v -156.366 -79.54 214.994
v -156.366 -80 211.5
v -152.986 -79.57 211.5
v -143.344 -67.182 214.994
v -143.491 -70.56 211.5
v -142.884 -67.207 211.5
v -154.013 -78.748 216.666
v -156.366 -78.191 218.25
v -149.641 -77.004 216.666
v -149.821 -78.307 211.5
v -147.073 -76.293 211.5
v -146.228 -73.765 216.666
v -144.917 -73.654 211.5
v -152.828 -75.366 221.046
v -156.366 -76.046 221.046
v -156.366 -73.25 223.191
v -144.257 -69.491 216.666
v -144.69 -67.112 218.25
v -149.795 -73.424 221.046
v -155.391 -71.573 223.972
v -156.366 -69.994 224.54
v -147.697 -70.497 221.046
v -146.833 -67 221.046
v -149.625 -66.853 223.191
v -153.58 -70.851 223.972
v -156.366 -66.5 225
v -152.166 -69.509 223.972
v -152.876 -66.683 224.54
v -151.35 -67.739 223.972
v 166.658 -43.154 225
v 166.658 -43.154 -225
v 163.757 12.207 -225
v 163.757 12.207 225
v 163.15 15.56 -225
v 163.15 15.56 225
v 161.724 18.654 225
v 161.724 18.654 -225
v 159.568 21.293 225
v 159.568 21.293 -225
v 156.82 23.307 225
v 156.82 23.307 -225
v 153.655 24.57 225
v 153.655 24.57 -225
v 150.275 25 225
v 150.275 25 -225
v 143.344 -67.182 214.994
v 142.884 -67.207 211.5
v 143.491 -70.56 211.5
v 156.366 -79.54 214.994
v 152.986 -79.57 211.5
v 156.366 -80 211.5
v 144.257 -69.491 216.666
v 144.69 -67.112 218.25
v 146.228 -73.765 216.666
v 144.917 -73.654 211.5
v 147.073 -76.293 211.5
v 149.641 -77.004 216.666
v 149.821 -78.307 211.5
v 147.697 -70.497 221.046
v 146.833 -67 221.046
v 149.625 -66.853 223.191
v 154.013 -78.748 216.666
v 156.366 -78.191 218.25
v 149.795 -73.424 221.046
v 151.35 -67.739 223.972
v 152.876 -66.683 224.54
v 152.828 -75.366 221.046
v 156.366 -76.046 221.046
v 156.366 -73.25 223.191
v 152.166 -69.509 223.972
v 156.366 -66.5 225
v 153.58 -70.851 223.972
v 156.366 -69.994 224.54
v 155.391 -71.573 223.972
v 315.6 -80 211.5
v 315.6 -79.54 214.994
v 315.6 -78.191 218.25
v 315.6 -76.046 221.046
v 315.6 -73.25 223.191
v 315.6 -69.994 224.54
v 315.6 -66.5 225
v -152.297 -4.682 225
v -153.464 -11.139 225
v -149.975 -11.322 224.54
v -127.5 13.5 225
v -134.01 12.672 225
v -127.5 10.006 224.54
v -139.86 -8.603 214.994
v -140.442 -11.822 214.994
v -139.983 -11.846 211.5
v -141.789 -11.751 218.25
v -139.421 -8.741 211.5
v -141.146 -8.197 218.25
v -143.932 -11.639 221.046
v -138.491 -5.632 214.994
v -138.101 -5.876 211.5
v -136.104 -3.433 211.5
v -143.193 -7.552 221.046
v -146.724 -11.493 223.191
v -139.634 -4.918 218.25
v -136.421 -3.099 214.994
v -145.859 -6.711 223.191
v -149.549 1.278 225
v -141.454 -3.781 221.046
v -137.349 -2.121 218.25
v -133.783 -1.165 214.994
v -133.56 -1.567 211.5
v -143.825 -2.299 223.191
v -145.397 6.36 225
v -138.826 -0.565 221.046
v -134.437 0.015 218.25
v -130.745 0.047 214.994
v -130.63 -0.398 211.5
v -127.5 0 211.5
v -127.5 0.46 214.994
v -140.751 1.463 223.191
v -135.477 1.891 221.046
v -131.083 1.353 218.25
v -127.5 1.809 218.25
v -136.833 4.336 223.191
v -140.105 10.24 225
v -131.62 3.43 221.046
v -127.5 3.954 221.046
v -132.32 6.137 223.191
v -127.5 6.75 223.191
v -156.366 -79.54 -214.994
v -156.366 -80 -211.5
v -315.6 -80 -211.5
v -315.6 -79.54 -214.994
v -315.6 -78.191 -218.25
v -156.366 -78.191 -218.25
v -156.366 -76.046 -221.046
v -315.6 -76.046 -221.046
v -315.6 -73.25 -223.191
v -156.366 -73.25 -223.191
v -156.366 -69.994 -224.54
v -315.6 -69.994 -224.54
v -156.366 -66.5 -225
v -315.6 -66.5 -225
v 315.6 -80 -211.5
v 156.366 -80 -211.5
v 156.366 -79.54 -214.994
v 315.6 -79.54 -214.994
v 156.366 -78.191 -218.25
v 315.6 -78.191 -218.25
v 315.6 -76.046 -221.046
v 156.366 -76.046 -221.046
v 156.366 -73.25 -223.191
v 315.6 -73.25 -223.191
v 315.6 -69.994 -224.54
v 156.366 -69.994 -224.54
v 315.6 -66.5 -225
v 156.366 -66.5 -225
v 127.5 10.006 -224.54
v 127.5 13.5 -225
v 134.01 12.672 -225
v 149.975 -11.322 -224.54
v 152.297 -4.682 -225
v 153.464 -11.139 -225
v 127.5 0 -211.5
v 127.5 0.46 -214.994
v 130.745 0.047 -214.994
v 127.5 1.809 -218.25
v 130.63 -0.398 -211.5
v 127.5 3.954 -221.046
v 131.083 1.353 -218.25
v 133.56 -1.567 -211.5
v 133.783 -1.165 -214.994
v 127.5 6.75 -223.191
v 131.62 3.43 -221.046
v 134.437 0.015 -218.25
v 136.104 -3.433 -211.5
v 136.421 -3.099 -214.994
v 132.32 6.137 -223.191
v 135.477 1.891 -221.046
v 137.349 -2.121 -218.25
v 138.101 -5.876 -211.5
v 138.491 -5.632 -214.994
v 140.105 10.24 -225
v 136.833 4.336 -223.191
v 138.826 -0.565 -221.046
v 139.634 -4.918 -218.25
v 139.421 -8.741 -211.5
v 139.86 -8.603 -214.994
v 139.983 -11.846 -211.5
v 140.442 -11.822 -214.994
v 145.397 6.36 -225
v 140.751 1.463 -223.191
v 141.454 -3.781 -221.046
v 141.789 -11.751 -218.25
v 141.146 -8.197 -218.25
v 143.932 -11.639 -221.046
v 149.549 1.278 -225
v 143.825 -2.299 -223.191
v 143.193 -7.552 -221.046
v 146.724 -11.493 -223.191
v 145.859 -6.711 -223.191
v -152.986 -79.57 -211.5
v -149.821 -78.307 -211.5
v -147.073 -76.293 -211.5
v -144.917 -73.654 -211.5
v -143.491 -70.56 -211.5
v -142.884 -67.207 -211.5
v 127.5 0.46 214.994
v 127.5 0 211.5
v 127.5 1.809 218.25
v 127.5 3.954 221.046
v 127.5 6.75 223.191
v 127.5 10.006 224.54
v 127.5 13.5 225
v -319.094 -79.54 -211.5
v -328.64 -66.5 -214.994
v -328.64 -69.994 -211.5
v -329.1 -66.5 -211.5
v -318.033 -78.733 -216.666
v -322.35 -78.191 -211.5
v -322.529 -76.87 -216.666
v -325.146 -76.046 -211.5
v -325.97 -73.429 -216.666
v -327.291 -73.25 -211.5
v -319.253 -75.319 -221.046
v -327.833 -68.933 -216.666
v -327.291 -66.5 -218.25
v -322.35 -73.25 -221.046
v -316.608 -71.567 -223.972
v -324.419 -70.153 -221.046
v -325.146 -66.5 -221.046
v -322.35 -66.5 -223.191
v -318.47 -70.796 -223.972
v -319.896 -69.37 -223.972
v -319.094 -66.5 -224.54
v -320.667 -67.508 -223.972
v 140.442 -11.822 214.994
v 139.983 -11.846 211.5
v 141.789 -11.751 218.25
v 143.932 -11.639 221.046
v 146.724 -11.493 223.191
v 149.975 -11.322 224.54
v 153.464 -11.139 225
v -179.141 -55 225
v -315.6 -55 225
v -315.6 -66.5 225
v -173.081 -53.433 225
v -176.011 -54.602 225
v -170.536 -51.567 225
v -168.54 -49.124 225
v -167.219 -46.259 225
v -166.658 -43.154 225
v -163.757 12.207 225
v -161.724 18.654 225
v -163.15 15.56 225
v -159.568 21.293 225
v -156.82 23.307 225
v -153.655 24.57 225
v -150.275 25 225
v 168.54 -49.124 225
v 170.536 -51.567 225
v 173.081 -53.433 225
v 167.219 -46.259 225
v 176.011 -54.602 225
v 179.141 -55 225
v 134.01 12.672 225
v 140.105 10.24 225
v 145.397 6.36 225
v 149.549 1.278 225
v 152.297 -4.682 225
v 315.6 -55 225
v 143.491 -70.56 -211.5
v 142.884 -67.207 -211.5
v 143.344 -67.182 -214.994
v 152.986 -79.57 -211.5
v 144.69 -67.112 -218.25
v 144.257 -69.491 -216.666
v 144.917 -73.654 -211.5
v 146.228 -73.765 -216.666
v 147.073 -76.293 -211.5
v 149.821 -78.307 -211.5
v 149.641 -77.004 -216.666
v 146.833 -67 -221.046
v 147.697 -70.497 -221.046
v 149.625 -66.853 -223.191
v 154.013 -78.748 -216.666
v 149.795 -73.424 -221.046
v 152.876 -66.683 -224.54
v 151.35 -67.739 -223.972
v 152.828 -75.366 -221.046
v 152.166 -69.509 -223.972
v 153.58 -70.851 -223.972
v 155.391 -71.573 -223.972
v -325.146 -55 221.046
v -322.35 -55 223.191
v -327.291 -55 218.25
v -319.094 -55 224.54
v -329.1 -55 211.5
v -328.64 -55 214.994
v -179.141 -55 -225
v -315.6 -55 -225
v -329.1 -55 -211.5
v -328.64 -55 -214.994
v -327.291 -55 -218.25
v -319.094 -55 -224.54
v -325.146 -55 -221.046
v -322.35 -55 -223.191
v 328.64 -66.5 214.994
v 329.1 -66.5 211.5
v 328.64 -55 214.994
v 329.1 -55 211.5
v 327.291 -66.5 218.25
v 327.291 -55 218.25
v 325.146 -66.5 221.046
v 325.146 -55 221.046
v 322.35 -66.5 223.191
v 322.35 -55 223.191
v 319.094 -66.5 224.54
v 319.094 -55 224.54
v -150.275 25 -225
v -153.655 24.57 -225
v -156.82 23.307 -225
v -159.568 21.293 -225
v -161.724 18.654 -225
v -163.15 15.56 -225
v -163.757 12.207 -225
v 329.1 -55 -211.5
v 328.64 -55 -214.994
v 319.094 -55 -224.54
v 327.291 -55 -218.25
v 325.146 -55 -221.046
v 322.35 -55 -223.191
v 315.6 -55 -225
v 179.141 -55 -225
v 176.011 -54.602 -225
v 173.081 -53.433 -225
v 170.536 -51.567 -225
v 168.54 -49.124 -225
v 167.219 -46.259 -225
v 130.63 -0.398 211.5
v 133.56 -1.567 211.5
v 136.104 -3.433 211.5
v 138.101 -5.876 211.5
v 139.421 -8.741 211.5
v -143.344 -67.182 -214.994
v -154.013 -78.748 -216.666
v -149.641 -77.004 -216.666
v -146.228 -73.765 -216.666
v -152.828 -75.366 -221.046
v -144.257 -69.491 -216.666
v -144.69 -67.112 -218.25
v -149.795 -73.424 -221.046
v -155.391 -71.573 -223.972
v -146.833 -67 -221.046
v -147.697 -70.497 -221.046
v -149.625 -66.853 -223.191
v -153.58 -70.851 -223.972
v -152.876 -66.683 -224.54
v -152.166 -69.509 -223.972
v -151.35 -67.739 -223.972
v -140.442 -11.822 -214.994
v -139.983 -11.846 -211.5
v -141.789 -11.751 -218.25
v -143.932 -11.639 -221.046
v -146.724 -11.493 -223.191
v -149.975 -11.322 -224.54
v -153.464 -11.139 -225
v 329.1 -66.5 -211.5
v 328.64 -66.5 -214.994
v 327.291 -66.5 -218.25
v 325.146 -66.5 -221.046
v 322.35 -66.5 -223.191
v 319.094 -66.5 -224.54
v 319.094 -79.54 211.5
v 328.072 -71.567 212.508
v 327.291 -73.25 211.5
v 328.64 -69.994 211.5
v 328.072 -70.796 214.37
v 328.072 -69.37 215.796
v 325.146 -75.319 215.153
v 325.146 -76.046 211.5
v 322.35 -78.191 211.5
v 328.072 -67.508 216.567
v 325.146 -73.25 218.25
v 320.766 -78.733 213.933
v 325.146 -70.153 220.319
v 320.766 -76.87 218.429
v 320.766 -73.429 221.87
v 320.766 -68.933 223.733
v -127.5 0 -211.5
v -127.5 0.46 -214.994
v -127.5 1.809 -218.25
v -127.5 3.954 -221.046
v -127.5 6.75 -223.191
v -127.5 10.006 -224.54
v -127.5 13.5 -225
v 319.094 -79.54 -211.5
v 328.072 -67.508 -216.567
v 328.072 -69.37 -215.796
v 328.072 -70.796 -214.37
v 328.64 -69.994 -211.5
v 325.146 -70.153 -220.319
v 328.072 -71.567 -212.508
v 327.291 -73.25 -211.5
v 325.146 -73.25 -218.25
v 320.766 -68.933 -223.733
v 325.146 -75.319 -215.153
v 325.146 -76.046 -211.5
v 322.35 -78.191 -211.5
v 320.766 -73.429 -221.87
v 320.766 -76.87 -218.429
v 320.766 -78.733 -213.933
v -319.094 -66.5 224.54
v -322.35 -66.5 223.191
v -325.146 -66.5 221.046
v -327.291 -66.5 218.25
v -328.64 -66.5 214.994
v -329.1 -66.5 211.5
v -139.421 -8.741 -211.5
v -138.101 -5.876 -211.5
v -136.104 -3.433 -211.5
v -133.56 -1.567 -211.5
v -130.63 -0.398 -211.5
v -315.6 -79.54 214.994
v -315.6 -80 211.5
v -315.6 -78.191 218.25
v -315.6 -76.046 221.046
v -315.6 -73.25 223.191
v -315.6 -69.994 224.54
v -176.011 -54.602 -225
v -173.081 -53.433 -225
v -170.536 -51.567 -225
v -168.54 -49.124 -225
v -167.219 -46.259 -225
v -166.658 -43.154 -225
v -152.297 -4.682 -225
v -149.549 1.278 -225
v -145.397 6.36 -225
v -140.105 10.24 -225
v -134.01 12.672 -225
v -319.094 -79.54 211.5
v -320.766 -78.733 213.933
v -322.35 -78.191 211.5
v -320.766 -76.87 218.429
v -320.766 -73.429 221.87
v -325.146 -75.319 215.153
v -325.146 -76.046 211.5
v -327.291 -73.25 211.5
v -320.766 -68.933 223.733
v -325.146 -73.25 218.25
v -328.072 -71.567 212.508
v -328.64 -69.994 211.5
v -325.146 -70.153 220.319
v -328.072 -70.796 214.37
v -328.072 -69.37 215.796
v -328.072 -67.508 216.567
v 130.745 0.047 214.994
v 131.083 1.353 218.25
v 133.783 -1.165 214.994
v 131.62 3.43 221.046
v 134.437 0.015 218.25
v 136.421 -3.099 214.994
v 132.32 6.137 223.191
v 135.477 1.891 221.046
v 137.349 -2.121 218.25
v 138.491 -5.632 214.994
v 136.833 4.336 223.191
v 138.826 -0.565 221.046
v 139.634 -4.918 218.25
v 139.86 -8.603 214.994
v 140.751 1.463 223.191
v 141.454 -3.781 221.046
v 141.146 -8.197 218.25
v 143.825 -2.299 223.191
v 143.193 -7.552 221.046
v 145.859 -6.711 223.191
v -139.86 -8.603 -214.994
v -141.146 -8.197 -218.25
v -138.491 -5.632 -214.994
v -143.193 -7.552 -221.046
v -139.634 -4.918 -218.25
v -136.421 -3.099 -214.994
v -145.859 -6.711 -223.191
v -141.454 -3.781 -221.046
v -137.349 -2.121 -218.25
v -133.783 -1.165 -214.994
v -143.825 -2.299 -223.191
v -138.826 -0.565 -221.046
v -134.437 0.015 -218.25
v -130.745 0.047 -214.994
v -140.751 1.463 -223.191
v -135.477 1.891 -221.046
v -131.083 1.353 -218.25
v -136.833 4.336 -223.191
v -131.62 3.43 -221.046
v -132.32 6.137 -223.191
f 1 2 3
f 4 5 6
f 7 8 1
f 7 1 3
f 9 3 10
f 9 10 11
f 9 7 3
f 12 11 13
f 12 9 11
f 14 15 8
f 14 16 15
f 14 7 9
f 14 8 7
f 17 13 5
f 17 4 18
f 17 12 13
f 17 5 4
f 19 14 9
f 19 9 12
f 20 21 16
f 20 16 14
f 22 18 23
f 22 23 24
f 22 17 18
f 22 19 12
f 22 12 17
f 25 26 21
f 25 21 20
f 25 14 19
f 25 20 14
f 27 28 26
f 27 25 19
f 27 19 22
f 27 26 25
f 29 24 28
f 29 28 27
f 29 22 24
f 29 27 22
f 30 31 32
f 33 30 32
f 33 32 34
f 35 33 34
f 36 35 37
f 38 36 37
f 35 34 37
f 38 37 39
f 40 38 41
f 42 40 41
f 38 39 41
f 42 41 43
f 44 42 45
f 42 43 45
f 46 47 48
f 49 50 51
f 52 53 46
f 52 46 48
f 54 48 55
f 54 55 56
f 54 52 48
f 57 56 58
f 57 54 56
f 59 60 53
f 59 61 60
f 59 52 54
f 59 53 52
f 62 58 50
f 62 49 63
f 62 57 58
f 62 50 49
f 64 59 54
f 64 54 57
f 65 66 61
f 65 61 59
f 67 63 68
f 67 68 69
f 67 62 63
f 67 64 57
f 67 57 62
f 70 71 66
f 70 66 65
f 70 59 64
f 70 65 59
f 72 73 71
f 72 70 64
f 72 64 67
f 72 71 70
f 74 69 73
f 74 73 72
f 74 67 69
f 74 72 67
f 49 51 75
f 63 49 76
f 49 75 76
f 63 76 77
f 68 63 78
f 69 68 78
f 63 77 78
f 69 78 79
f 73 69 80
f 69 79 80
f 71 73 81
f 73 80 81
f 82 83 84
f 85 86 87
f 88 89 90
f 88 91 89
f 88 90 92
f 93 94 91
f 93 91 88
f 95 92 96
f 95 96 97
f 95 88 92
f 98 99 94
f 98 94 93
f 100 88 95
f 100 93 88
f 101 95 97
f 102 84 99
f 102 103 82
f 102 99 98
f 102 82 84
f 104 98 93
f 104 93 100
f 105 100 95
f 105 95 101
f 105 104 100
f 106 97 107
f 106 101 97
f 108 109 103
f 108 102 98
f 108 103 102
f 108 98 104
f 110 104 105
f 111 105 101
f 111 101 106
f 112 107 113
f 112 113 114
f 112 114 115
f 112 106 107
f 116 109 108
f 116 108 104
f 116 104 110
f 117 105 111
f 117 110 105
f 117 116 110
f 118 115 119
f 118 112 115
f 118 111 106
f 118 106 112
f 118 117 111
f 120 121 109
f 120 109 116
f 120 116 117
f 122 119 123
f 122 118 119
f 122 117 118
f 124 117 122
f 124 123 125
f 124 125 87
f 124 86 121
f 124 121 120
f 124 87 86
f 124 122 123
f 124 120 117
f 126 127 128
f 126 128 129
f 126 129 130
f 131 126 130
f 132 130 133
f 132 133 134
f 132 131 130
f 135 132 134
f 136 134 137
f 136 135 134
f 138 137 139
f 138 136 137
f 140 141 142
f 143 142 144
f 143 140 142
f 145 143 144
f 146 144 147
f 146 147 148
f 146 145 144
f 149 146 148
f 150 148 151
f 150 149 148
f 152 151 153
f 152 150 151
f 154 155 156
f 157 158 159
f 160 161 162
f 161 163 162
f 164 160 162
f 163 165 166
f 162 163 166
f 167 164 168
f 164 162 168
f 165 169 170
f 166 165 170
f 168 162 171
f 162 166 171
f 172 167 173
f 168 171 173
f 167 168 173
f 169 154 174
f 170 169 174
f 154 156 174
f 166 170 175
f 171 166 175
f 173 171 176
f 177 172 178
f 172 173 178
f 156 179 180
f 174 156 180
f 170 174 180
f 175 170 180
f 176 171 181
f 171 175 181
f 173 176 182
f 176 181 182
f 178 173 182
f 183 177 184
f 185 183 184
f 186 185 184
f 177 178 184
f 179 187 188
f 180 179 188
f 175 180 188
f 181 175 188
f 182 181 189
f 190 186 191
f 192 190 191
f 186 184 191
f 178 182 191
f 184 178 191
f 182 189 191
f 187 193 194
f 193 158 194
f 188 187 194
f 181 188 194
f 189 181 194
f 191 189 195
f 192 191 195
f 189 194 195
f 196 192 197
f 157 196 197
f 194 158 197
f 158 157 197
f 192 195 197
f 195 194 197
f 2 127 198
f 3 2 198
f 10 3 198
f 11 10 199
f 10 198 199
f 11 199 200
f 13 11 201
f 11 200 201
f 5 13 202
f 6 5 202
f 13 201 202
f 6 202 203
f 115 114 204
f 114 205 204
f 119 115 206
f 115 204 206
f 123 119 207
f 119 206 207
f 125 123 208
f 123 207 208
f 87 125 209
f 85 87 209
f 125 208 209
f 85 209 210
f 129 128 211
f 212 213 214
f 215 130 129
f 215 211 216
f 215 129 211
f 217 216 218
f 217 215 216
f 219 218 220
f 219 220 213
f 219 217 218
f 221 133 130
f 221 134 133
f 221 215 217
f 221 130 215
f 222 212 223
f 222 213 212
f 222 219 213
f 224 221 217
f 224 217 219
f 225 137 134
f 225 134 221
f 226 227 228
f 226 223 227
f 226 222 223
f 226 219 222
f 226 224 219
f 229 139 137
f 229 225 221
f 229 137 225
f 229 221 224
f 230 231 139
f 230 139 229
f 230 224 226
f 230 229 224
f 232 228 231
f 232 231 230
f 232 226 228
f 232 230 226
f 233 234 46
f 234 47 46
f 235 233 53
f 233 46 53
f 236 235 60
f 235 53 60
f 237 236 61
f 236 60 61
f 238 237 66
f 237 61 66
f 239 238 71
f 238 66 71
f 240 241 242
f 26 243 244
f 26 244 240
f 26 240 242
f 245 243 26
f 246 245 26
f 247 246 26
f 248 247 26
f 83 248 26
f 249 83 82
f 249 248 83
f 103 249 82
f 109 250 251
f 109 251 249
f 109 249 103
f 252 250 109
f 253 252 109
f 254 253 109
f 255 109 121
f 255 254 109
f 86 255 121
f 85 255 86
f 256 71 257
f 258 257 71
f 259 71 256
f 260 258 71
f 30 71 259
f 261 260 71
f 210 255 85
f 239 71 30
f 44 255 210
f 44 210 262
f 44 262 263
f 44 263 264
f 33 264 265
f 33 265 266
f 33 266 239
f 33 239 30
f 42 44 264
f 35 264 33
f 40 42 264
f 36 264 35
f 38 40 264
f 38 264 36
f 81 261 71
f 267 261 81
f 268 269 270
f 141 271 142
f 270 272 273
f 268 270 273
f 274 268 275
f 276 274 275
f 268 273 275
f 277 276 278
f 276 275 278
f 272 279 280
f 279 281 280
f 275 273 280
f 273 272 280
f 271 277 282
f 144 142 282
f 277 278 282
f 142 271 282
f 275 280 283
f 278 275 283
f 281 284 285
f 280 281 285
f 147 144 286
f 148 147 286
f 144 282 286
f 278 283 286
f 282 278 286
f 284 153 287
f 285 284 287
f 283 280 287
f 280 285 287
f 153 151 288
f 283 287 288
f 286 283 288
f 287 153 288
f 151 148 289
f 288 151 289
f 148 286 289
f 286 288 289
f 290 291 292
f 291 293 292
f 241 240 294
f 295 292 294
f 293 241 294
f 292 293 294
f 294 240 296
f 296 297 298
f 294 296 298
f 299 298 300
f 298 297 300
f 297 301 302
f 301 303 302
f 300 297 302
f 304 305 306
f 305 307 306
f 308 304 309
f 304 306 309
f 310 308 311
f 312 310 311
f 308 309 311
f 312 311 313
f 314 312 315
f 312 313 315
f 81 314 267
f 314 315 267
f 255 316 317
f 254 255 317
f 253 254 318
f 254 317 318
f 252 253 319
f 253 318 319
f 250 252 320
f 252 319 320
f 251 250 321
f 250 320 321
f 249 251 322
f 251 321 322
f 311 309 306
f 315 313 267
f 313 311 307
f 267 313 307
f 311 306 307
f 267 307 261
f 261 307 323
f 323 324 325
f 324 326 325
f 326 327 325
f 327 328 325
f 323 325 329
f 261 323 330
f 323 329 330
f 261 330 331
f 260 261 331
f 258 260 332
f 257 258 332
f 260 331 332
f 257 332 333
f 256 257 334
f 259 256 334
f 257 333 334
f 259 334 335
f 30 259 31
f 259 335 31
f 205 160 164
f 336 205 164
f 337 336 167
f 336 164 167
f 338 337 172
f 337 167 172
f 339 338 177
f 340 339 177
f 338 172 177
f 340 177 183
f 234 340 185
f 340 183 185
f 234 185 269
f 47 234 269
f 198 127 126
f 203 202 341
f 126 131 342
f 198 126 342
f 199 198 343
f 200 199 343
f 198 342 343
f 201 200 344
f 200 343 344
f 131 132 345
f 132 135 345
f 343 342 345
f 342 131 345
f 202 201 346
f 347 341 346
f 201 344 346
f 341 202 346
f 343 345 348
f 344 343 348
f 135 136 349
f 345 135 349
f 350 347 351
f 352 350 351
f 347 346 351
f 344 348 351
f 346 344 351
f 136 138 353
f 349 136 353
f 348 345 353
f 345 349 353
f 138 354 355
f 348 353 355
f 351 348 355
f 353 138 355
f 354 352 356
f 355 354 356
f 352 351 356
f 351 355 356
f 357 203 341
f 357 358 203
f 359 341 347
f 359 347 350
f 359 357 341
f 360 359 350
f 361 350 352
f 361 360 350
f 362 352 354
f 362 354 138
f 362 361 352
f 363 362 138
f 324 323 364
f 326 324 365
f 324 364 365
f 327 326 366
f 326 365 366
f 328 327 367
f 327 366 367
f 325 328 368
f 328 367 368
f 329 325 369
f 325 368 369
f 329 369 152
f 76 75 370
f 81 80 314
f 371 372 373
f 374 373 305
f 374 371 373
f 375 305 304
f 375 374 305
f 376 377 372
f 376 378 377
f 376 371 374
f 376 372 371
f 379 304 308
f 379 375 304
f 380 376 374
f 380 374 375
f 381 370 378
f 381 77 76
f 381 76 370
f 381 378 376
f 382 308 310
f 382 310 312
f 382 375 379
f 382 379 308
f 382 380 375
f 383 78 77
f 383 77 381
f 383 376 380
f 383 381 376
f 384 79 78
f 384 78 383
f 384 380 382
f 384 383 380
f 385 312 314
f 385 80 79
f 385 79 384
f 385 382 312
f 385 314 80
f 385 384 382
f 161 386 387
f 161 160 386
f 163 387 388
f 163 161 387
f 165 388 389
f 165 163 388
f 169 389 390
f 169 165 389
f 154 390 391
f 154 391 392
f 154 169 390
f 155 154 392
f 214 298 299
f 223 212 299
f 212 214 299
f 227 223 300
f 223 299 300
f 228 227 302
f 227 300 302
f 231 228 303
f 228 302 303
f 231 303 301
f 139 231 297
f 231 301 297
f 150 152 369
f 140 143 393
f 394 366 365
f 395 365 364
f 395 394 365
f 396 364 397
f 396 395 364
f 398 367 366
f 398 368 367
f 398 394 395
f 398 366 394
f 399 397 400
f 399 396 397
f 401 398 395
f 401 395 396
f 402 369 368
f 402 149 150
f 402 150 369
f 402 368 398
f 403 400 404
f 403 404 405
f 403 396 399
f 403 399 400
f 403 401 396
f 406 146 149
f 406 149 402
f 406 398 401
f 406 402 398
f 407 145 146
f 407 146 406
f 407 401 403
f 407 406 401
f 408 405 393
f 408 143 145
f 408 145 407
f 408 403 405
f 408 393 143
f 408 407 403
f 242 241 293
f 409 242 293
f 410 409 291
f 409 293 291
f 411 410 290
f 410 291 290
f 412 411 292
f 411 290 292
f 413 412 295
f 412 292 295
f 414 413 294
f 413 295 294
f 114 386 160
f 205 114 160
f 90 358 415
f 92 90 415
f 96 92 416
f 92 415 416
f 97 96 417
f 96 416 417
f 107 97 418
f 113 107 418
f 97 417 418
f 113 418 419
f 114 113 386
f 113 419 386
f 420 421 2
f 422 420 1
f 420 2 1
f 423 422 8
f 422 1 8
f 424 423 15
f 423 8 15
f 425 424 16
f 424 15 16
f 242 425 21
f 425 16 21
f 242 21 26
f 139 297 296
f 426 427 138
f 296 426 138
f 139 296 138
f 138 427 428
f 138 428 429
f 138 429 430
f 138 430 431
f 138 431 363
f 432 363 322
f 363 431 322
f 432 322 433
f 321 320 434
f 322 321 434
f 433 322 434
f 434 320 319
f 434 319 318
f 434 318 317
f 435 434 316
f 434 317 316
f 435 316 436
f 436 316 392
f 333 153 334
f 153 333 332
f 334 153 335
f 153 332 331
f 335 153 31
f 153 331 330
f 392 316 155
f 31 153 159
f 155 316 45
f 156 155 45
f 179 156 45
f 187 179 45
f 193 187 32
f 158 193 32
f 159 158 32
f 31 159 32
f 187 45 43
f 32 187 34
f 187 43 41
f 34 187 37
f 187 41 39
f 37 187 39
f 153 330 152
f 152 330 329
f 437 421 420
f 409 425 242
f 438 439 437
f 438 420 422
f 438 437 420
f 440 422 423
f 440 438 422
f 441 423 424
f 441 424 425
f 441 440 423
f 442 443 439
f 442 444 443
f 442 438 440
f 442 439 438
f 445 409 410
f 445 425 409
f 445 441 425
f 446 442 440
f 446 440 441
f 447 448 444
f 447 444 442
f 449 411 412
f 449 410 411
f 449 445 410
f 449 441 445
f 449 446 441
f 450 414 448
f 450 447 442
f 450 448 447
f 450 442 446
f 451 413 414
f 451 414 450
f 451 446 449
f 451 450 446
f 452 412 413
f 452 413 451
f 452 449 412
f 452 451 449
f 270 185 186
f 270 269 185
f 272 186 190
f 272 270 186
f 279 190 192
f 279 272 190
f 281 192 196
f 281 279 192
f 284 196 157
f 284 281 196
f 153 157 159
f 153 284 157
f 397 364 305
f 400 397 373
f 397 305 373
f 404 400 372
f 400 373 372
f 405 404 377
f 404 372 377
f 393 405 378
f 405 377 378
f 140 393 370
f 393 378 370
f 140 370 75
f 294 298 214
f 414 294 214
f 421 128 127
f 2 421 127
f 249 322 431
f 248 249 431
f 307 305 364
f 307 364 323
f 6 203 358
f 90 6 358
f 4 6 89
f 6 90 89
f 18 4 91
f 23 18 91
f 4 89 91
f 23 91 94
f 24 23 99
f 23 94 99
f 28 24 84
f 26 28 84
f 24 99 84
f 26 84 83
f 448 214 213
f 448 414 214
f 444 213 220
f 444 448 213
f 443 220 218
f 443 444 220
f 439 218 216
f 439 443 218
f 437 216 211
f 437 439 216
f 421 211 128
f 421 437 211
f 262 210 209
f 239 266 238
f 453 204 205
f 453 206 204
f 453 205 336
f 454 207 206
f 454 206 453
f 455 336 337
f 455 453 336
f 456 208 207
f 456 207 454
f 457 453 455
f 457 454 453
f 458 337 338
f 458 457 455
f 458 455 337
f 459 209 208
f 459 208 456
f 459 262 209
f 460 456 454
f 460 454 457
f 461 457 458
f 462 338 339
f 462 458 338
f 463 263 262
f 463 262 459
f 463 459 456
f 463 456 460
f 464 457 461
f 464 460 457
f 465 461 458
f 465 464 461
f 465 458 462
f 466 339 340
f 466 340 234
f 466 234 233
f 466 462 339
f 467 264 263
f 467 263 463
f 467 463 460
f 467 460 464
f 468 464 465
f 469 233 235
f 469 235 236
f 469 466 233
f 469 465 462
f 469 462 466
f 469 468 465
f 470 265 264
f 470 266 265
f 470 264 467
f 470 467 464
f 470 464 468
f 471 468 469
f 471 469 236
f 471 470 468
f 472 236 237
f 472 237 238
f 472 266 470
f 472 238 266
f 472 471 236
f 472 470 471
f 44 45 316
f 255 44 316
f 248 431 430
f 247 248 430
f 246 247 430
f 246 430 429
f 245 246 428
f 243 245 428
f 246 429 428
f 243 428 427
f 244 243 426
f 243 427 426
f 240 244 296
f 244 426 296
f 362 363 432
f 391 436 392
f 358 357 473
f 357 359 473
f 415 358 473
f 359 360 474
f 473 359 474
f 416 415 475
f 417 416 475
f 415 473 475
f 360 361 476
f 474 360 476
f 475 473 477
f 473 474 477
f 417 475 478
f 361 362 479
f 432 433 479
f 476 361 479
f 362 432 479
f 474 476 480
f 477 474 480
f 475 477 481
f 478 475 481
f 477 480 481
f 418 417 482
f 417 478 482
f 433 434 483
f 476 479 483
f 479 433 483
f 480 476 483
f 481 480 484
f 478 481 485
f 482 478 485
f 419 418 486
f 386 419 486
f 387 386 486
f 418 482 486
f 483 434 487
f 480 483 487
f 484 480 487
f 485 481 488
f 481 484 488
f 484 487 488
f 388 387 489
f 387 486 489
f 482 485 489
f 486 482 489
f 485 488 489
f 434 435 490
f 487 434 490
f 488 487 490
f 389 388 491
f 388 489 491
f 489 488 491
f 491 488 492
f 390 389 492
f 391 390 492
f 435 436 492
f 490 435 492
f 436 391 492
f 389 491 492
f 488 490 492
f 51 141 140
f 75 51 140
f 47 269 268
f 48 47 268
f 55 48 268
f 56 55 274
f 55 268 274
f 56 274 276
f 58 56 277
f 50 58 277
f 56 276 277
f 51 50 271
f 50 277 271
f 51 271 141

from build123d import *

# Parameters (mm, degrees)
BOSS_EXTRUDE1_DEPTH      = 225
BOSS_EXTRUDE1_DEPTH_BACK = 225
FILLET1_R                = 13.5
FILLET2_R                = 13.5
FILLET3_R                = 13.5


with BuildPart() as part:
    # Sketch1 → Boss-Extrude1 (new, two sides: drawn at the far end of the back side and taken through both)
    with BuildSketch(Plane.XY.offset(-BOSS_EXTRUDE1_DEPTH_BACK)):
        with BuildLine():
            Line((-329.1, -55), (-329.1, -80))
            Line((-329.1, -80), (-156.365701077, -80))
            ThreePointArc((-156.365701077, -80), (-147.072914305, -76.292554009), (-142.884202358, -67.206535409))
            Line((-142.884202358, -67.206535409), (-139.982869184, -11.845800547))
            ThreePointArc((-139.982869184, -11.845800547), (-136.104432196, -3.432820362), (-127.5, 0))
            Line((-127.5, 0), (127.5, 0))
            ThreePointArc((127.5, 0), (136.104432196, -3.432820362), (139.982869184, -11.845800547))
            Line((139.982869184, -11.845800547), (142.884202358, -67.206535409))
            ThreePointArc((142.884202358, -67.206535409), (147.072914305, -76.292554009), (156.365701077, -80))
            Line((156.365701077, -80), (329.1, -80))
            Line((329.1, -80), (329.1, -55))
            Line((329.1, -55), (179.140850678, -55))
            ThreePointArc((179.140850678, -55), (170.536418482, -51.567179638), (166.657981494, -43.154199453))
            Line((166.657981494, -43.154199453), (163.75664832, 12.206535409))
            ThreePointArc((163.75664832, 12.206535409), (159.567936373, 21.292554009), (150.275149601, 25))
            Line((150.275149601, 25), (-150.275149601, 25))
            ThreePointArc((-150.275149601, 25), (-159.567936373, 21.292554009), (-163.75664832, 12.206535409))
            Line((-163.75664832, 12.206535409), (-166.657981494, -43.154199453))
            ThreePointArc((-166.657981494, -43.154199453), (-170.536418482, -51.567179638), (-179.140850678, -55))
            Line((-179.140850678, -55), (-329.1, -55))
        make_face()
    extrude(amount=BOSS_EXTRUDE1_DEPTH + BOSS_EXTRUDE1_DEPTH_BACK)

    # Fillet1
    fillet1_edges = [part.edges().sort_by_distance(p)[0] for p in [
        (-242.732850539, -80, -225),
        (-147.072914305, -76.292554009, -225),
        (-141.433535771, -39.526167978, -225),
        (-136.104432196, -3.432820362, -225),
        (0, 0, -225),
        (136.104432196, -3.432820362, -225),
        (-329.1, -80, 0),
        (141.433535771, -39.526167978, -225),
        (147.072914305, -76.292554009, -225),
        (242.732850539, -80, -225),
        (-242.732850539, -80, 225),
        (-147.072914305, -76.292554009, 225),
        (-141.433535771, -39.526167978, 225),
        (-136.104432196, -3.432820362, 225),
        (0, 0, 225),
        (136.104432196, -3.432820362, 225),
        (141.433535771, -39.526167978, 225),
        (147.072914305, -76.292554009, 225),
        (242.732850539, -80, 225),
    ]]
    fillet(fillet1_edges, radius=FILLET1_R)

    # Fillet2
    fillet2_edges = [part.edges().sort_by_distance(p)[0] for p in [
        (329.1, -80, 0),
        (329.1, -60.75, 225),
        (329.1, -60.75, -225),
        (329.1, -76.045941546, 221.045941546),
        (329.1, -76.045941546, -221.045941546),
    ]]
    fillet(fillet2_edges, radius=FILLET2_R)

    # Fillet3
    # the kernel refuses this fillet: 13.5 mm, written as the material it takes off along each edge
    with BuildSketch(Plane(origin=(-315.6, -66.5, 211.5), x_dir=(0, 0, 1), z_dir=(-1, 0, 0))) as fillet3_piece_1_section:
        Polygon((0, 0), (FILLET3_R, 0), (FILLET3_R, -FILLET3_R), (0, -FILLET3_R), align=None)
    fillet3_piece_1 = extrude(amount=FILLET3_R, mode=Mode.PRIVATE)
    fillet3_piece_1 = fillet3_piece_1 - Plane(origin=(-315.6, -66.5, 211.5), x_dir=(0, 0.7071067811865475, -0.7071067811865475), z_dir=(-1, 0, 0)) * Sphere(FILLET3_R, mode=Mode.PRIVATE)
    add(fillet3_piece_1, mode=Mode.SUBTRACT)
    with BuildSketch(Plane(origin=(-315.6, -66.5, -211.5), x_dir=(-1, 0, 0), z_dir=(0, 0, -1))) as fillet3_piece_2_section:
        Polygon((0, 0), (FILLET3_R, 0), (FILLET3_R, -FILLET3_R), (0, -FILLET3_R), align=None)
    fillet3_piece_2 = extrude(amount=FILLET3_R, mode=Mode.PRIVATE)
    fillet3_piece_2 = fillet3_piece_2 - Plane(origin=(-315.6, -66.5, -211.5), x_dir=(0.7071067811865475, 0.7071067811865475, 0), z_dir=(0, 0, -1)) * Sphere(FILLET3_R, mode=Mode.PRIVATE)
    add(fillet3_piece_2, mode=Mode.SUBTRACT)
    with BuildSketch(Plane(origin=(-329.1, -21.25, 225), x_dir=(0, 0, -1), z_dir=(0, -1, 0)), Plane(origin=(-329.1, -21.25, -225), x_dir=(1, 0, 0), z_dir=(0, -1, 0))) as fillet3_piece_3:
        with BuildLine():
            CenterArc((FILLET3_R, FILLET3_R), FILLET3_R, 180, 90)
            Line((0, FILLET3_R), (0, 0))
            Line((0, 0), (FILLET3_R, 0))
        make_face()
    extrude(amount=45.25, mode=Mode.SUBTRACT)


solid = part.part
